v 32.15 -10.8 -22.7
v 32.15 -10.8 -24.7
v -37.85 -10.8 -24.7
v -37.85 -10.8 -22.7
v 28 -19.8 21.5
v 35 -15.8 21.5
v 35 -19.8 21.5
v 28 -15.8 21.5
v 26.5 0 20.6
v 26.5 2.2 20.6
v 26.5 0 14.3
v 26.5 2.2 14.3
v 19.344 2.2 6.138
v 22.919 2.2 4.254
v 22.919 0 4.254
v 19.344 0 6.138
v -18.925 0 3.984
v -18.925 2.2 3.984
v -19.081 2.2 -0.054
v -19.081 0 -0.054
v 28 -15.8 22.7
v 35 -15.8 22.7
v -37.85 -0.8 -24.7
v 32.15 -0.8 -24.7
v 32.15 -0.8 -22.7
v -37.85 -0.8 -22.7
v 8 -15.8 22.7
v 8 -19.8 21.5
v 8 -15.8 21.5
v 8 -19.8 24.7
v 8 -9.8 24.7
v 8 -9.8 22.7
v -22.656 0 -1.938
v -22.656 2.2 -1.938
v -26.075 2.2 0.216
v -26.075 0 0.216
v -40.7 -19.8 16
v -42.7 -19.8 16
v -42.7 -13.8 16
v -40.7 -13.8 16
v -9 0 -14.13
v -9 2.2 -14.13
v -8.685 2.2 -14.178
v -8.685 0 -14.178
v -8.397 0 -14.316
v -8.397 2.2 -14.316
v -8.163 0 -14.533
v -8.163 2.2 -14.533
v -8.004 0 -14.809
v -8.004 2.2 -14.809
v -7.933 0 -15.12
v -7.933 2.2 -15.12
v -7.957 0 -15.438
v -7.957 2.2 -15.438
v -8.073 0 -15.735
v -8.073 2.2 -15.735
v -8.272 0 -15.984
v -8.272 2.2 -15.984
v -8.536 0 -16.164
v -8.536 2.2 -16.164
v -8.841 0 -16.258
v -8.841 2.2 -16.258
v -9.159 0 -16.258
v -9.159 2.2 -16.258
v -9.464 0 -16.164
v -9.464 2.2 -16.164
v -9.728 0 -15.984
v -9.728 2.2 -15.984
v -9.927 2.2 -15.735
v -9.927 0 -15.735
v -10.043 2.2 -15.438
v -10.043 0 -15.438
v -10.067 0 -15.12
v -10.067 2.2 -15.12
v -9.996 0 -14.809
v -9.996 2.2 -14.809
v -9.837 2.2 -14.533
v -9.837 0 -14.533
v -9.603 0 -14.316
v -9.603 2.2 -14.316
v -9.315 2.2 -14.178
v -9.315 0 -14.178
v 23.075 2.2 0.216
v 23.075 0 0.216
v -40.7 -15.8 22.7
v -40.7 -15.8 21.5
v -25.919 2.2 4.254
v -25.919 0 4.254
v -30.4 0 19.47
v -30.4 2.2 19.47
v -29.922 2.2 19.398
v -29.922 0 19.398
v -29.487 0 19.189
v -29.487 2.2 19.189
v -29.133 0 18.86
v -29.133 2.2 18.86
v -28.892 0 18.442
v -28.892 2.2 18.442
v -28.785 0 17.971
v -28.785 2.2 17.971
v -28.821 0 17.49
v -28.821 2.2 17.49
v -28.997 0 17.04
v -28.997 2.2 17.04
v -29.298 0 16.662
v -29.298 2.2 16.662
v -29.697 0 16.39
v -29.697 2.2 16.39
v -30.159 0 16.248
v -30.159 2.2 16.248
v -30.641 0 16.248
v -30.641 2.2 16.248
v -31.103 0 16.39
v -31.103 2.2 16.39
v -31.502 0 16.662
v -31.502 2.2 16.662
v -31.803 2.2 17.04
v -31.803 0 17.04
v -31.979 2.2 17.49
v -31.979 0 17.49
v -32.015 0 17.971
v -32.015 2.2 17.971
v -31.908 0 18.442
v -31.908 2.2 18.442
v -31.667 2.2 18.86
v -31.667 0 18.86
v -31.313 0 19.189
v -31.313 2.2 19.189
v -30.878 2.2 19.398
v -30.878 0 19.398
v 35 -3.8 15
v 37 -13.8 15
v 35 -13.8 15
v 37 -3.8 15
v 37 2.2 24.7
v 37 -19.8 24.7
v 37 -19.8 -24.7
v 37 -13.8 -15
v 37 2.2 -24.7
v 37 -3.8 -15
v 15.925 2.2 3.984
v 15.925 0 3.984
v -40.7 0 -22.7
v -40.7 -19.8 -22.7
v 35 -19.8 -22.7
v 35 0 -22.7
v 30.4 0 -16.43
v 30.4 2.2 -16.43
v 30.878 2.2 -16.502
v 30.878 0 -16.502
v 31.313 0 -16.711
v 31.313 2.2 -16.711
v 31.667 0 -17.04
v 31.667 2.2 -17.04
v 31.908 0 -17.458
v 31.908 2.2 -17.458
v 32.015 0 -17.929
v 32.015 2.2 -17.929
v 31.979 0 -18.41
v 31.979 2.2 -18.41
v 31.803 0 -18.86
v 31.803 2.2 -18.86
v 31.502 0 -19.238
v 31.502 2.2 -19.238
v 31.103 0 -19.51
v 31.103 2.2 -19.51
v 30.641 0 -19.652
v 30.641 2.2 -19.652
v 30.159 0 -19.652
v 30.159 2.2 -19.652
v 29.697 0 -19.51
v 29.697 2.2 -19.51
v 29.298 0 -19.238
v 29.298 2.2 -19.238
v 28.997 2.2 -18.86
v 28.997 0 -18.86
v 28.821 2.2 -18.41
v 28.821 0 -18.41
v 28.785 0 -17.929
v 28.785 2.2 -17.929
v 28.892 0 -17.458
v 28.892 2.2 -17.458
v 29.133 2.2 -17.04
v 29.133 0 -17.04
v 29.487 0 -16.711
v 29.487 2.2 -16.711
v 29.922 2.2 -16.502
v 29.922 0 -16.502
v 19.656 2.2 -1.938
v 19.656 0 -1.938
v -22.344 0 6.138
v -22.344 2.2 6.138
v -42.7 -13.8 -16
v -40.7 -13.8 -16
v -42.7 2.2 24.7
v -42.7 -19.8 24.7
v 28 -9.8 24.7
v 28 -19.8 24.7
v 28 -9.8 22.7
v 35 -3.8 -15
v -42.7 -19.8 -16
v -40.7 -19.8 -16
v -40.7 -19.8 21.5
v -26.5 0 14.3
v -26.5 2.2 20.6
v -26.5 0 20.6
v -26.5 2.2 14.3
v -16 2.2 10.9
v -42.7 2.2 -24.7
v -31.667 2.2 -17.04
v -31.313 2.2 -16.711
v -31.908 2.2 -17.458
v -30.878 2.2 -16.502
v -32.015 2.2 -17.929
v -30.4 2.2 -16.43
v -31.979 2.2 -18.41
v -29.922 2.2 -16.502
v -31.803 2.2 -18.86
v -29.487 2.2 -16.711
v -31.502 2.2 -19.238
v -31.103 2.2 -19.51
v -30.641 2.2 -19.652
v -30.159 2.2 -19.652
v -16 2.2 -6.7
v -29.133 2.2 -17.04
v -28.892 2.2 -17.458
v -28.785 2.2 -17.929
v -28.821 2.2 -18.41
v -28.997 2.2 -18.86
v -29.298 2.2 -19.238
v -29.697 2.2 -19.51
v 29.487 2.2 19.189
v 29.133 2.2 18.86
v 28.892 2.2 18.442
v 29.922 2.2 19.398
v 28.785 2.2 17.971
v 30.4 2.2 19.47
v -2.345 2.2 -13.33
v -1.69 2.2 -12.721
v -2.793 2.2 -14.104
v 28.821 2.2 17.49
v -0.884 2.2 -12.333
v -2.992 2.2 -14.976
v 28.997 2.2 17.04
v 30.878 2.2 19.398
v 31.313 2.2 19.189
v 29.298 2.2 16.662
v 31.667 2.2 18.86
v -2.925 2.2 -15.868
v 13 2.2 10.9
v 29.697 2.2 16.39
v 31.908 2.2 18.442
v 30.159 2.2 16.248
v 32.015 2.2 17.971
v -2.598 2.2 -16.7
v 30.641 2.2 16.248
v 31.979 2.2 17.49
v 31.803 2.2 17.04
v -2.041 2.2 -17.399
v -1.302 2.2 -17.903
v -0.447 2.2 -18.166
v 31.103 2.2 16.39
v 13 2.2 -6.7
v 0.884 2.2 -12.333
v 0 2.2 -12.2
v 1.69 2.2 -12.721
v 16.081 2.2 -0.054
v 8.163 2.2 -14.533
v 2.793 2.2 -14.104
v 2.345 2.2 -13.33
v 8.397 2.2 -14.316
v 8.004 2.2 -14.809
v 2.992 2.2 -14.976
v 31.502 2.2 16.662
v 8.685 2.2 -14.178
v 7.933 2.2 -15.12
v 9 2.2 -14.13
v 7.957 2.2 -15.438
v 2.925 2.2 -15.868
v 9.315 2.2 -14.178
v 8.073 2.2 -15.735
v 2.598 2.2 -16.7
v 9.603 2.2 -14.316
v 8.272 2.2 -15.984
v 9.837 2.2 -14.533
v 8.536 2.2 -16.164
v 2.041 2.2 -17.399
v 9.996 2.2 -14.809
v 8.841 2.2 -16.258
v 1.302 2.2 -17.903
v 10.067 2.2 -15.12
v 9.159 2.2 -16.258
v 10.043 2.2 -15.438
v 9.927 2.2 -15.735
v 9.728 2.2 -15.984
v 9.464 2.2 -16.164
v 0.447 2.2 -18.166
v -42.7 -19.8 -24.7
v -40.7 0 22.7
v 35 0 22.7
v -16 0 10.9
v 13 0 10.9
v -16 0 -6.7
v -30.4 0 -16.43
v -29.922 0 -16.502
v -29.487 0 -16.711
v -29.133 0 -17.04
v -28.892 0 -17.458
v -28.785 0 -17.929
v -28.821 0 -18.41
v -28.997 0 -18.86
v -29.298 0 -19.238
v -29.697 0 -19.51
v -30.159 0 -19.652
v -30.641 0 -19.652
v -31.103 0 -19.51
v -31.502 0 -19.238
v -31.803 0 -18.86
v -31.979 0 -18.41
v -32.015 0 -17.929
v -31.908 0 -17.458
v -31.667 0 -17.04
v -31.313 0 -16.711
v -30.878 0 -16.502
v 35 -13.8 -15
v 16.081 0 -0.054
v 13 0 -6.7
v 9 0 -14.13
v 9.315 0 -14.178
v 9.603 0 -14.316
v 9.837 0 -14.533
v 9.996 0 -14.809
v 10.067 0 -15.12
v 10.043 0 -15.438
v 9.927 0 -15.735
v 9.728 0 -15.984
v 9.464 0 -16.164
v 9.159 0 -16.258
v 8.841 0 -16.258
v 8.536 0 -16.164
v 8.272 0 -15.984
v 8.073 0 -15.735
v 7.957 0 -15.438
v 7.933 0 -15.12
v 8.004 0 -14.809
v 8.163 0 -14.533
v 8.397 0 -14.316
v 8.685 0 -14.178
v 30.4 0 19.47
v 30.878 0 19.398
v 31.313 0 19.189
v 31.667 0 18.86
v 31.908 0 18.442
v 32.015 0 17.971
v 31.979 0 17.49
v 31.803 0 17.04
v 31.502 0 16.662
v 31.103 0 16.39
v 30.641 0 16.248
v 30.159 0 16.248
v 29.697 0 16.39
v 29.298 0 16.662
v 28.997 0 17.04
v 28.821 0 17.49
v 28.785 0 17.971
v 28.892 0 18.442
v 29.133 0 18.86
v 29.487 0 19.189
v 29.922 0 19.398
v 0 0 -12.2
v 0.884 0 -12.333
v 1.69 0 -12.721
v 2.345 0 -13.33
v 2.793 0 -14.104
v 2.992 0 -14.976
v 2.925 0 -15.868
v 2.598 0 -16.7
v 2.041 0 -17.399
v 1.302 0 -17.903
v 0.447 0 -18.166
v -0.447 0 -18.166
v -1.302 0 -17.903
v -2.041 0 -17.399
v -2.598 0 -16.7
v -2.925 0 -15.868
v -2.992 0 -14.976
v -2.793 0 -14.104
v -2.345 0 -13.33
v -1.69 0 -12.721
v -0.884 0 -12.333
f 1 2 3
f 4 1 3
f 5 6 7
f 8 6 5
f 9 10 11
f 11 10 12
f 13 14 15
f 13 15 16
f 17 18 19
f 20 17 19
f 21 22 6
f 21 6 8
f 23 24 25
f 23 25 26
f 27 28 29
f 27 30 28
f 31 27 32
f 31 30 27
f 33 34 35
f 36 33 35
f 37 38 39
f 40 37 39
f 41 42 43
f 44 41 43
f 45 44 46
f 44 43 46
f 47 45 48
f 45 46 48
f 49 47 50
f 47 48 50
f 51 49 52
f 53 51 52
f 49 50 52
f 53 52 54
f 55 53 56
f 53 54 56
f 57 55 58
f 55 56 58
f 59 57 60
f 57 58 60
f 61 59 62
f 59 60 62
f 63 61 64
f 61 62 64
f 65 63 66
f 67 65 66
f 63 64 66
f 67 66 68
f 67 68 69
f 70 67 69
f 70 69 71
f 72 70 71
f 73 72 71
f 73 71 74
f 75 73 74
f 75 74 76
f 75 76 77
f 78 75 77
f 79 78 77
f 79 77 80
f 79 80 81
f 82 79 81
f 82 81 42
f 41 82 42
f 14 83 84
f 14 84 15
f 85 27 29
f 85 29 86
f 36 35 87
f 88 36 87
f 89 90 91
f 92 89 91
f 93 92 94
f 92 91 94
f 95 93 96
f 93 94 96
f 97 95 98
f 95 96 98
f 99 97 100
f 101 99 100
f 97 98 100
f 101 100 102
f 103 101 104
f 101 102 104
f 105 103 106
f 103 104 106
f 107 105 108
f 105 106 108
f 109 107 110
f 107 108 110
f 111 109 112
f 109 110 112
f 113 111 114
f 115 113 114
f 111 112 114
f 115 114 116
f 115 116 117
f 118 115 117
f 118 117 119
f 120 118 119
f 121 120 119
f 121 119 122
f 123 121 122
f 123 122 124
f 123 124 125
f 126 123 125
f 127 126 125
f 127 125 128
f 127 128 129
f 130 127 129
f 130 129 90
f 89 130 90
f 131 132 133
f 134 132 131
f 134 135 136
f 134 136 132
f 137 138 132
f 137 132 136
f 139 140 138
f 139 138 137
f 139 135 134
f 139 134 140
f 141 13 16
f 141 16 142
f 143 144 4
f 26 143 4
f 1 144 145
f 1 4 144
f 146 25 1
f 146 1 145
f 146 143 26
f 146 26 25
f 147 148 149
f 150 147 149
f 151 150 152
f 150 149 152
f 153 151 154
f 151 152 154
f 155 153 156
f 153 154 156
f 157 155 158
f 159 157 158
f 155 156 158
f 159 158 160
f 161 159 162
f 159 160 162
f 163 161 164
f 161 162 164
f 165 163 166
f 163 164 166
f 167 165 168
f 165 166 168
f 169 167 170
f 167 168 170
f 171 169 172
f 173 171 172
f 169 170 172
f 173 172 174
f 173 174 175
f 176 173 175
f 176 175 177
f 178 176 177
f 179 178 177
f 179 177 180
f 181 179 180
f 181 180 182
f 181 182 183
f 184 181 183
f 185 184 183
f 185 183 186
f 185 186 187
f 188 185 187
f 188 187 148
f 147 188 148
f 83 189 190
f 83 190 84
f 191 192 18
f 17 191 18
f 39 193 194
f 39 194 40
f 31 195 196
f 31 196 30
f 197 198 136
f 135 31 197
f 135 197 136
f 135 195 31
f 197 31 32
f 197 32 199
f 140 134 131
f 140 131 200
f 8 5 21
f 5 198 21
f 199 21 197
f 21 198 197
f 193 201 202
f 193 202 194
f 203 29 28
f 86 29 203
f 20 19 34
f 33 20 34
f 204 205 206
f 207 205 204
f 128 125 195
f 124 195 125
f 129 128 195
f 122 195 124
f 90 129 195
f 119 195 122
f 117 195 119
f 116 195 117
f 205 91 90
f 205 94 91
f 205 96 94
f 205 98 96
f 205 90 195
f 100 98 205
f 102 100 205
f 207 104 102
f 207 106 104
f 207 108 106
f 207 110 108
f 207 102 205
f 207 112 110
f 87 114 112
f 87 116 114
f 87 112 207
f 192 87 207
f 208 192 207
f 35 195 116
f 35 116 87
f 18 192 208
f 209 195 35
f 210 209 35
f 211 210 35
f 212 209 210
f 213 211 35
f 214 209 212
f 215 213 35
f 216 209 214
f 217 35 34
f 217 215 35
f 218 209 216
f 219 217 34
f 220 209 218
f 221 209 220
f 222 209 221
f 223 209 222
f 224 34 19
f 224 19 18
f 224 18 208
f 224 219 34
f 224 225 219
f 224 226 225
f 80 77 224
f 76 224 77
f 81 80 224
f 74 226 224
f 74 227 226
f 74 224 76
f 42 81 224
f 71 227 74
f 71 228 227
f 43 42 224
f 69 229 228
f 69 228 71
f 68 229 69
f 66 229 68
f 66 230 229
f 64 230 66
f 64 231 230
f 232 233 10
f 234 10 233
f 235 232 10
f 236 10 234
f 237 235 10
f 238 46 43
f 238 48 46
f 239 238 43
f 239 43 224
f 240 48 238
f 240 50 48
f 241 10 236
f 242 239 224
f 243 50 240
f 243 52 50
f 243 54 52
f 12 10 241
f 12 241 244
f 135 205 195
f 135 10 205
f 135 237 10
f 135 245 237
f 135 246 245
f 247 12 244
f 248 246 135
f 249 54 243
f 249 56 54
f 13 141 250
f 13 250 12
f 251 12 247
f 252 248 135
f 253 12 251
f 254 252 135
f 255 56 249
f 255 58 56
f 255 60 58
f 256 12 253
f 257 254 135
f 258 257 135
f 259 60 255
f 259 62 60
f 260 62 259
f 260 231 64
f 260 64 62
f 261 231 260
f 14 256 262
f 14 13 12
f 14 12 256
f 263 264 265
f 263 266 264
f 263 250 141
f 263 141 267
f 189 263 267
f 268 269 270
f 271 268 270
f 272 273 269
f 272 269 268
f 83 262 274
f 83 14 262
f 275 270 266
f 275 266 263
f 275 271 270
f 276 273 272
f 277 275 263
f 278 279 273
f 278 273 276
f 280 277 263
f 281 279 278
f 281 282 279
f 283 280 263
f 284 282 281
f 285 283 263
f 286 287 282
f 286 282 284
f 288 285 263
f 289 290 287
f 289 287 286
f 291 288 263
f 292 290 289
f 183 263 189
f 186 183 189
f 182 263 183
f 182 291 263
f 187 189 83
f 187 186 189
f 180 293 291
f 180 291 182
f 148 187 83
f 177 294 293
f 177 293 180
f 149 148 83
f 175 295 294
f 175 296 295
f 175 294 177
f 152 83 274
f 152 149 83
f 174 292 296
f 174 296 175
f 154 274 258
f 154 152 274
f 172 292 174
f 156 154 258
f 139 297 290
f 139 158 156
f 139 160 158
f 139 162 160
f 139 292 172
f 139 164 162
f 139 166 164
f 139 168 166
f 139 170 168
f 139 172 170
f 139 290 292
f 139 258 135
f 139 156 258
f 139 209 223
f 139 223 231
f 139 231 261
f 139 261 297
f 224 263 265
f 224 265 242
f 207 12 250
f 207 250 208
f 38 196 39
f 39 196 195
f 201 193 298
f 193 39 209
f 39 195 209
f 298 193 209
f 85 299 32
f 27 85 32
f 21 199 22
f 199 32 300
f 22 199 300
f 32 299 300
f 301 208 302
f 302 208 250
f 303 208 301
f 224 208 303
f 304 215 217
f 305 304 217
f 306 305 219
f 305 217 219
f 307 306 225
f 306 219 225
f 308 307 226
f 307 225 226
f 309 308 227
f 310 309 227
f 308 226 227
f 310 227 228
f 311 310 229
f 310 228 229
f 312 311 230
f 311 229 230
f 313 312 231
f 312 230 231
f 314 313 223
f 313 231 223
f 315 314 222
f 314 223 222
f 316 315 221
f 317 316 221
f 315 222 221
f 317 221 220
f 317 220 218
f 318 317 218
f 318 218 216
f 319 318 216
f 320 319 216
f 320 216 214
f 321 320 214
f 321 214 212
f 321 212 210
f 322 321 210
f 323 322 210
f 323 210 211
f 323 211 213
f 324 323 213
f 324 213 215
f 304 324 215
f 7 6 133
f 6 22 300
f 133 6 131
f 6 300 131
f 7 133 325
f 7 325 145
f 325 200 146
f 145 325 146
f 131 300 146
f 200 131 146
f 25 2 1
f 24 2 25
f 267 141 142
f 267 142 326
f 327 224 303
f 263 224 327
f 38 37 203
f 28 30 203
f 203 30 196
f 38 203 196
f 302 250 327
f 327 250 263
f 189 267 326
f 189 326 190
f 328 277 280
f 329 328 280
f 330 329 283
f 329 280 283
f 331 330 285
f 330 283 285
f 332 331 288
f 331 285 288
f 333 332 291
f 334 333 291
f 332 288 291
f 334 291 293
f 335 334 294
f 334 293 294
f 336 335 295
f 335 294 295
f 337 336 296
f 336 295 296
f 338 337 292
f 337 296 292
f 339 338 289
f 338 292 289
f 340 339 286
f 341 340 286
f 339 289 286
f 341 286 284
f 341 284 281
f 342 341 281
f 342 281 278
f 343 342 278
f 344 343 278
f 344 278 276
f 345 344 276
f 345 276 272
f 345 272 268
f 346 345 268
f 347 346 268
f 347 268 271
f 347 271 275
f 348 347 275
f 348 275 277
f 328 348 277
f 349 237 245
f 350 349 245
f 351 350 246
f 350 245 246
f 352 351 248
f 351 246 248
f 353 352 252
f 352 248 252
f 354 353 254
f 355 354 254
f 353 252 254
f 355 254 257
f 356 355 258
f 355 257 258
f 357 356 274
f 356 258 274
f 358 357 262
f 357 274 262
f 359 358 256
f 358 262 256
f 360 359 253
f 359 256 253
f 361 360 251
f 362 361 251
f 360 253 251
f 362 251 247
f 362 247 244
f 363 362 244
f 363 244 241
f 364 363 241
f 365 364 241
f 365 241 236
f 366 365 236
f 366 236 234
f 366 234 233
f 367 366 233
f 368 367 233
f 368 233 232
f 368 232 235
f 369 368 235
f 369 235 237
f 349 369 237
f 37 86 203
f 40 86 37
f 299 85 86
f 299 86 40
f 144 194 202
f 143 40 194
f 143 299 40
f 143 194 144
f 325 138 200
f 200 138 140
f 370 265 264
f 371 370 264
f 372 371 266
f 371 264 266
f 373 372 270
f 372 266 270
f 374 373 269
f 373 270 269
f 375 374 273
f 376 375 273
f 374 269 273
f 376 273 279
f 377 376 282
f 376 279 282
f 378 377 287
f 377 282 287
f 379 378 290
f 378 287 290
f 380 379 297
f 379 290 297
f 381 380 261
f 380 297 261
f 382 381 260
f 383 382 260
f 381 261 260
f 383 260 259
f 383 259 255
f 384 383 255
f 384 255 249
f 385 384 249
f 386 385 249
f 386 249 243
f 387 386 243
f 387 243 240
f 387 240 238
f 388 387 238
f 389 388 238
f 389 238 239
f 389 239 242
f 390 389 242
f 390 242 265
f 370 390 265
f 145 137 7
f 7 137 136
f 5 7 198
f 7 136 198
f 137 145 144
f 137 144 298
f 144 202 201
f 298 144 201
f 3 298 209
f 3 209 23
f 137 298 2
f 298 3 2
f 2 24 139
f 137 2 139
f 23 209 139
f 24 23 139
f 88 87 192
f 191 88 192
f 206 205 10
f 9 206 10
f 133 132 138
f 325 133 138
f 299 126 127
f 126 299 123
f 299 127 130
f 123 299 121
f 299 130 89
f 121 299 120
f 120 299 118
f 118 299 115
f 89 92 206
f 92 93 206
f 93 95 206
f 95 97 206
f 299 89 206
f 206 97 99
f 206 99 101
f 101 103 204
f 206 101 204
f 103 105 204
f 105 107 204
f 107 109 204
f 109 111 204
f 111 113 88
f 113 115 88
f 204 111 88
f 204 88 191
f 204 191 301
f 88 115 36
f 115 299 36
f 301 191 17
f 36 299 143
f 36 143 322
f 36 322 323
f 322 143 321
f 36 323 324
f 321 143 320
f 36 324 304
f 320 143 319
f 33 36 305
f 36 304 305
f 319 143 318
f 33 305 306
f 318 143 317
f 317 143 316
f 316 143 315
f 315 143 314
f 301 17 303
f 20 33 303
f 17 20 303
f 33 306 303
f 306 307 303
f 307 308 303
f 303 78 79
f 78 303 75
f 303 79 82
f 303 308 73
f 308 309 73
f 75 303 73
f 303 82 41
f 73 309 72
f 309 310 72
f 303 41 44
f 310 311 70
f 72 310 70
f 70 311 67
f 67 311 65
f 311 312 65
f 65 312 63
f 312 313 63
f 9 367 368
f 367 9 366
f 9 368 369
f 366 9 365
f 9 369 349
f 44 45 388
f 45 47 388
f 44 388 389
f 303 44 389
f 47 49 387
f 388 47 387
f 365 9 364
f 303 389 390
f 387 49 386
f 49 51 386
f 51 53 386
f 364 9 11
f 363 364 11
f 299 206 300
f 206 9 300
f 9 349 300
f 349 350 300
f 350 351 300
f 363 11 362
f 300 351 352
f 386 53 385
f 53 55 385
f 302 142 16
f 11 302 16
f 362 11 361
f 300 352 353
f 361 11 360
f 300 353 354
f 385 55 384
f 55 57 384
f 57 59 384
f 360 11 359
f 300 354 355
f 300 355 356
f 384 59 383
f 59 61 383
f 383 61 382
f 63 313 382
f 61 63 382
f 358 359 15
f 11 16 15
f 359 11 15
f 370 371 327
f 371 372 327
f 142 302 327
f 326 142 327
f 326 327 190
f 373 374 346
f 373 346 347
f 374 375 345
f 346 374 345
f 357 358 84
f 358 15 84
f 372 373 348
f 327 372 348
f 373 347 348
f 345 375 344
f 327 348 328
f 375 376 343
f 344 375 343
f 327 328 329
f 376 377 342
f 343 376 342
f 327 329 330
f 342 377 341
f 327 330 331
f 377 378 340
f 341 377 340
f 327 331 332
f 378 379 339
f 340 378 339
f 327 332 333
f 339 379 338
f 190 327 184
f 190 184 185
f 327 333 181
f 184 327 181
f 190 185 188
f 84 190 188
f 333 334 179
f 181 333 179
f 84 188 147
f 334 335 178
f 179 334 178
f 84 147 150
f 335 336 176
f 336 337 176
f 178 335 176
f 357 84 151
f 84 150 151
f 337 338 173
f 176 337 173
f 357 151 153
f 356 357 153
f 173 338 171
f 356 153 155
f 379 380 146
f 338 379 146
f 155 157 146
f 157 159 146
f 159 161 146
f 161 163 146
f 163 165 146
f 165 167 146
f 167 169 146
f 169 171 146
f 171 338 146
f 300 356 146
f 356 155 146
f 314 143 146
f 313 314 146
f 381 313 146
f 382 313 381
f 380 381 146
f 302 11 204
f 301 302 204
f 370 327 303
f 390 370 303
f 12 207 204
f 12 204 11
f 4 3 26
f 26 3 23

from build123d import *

# Parameters (mm, degrees)
SKETCH_1_W           = 70
SKETCH_1_H           = 45.4
EXTRUDE_1_DEPTH      = 2.2
SKETCH_2_R           = 1.62
CUT_EXTRUDE_1_DEPTH  = 12.2
SKETCH_3_W           = 29
SKETCH_3_H           = 17.6
CUT_EXTRUDE_2_DEPTH  = 12.2
SKETCH_5_R           = 1.07
SKETCH_5_R_2         = 3
CUT_EXTRUDE_4_DEPTH  = 12.2
SKETCH_6_W           = 53
SKETCH_6_H           = 6.3
CUT_EXTRUDE_5_DEPTH  = 12.2
SKETCH_7_W           = 75.7
SKETCH_7_H           = 2
EXTRUDE_3_DEPTH      = 22
SKETCH_8_W           = 2
SKETCH_8_H           = 49.4
EXTRUDE_4_DEPTH      = 22
SKETCH_9_W           = 75.7
SKETCH_9_H           = 2
EXTRUDE_5_DEPTH      = 22
SKETCH_10_W          = 5.7
SKETCH_10_H          = 45.4
EXTRUDE_6_DEPTH      = 2.2
SKETCH_11_W          = 2
SKETCH_11_H          = 49.4
EXTRUDE_7_DEPTH      = 22
SKETCH_12_W          = 20
SKETCH_12_H          = 10
CUT_EXTRUDE_6_DEPTH  = 22
SKETCH_13_W          = 32
SKETCH_13_H          = 6
CUT_EXTRUDE_7_DEPTH  = 22
SKETCH_14_W          = 30
SKETCH_14_H          = 10
CUT_EXTRUDE_8_DEPTH  = 22
SKETCH_16_W          = 70
SKETCH_16_H          = 10
CUT_EXTRUDE_9_DEPTH  = 22
SKETCH_17_W          = 48.7
SKETCH_17_H          = 4
EXTRUDE_8_DEPTH      = 1.2
SKETCH_18_W          = 7
SKETCH_18_H          = 4
EXTRUDE_9_DEPTH      = 1.2
CUT_EXTRUDE_10_DEPTH = 11.2


with BuildPart() as part:
    # 草图1 → 凸台-拉伸1 (new body)
    with BuildSketch(Plane(origin=(0, 0, 0), x_dir=(1, 0, 0), z_dir=(0, 1, 0))):
        Rectangle(SKETCH_1_W, SKETCH_1_H)
    extrude(amount=EXTRUDE_1_DEPTH)

    # 草图2 → 切除-拉伸1 (cut)
    with BuildSketch(Plane(origin=(0, 2.2, 0), x_dir=(1, 0, 0), z_dir=(0, 1, 0))):
        with Locations(Location((-30.4, 18.05, 0), (0, 0, 270))):
            Circle(SKETCH_2_R)
        with Locations(Location((-30.4, -17.85, 0), (0, 0, 270))):
            Circle(SKETCH_2_R)
        with Locations(Location((30.4, -17.85, 0), (0, 0, 270))):
            Circle(SKETCH_2_R)
        with Locations(Location((30.4, 18.05, 0), (0, 0, 270))):
            Circle(SKETCH_2_R)
    extrude(amount=-CUT_EXTRUDE_1_DEPTH, mode=Mode.SUBTRACT)

    # 草图3 → 切除-拉伸2 (cut)
    with BuildSketch(Plane(origin=(0, 2.2, 0), x_dir=(1, 0, 0), z_dir=(0, 1, 0))):
        with Locations((-1.5, -2.1)):
            Rectangle(SKETCH_3_W, SKETCH_3_H)
    extrude(amount=-CUT_EXTRUDE_2_DEPTH, mode=Mode.SUBTRACT)

    # 草图5 → 切除-拉伸4 (cut)
    with BuildSketch(Plane(origin=(0, 2.2, 0), x_dir=(1, 0, 0), z_dir=(0, 1, 0))):
        with Locations(Location((9, 15.2, 0), (0, 0, 270))):
            Circle(SKETCH_5_R)
        with Locations(Location((-9, 15.2, 0), (0, 0, 270))):
            Circle(SKETCH_5_R)
        with Locations(Location((0, 15.2, 0), (0, 0, 270))):
            Circle(SKETCH_5_R_2)
    extrude(amount=-CUT_EXTRUDE_4_DEPTH, mode=Mode.SUBTRACT)

    # 草图6 → 切除-拉伸5 (cut)
    with BuildSketch(Plane(origin=(0, 2.2, 0), x_dir=(1, 0, 0), z_dir=(0, 1, 0))):
        with Locations((0, -17.45)):
            Rectangle(SKETCH_6_W, SKETCH_6_H)
    extrude(amount=-CUT_EXTRUDE_5_DEPTH, mode=Mode.SUBTRACT)

    # 草图7 → 凸台-拉伸3 (add)
    with BuildSketch(Plane(origin=(0, 2.2, 0), x_dir=(1, 0, 0), z_dir=(0, 1, 0))):
        with Locations((-2.85, 23.7)):
            Rectangle(SKETCH_7_W, SKETCH_7_H)
    extrude(amount=-EXTRUDE_3_DEPTH)

    # 草图8 → 凸台-拉伸4 (add)
    with BuildSketch(Plane(origin=(0, 2.2, 0), x_dir=(1, 0, 0), z_dir=(0, 1, 0))):
        with Locations((36, 0)):
            Rectangle(SKETCH_8_W, SKETCH_8_H)
    extrude(amount=-EXTRUDE_4_DEPTH)

    # 草图9 → 凸台-拉伸5 (add)
    with BuildSketch(Plane(origin=(0, 2.2, 0), x_dir=(1, 0, 0), z_dir=(0, 1, 0))):
        with Locations((-2.85, -23.7)):
            Rectangle(SKETCH_9_W, SKETCH_9_H)
    extrude(amount=-EXTRUDE_5_DEPTH)

    # 草图10 → 凸台-拉伸6 (add)
    with BuildSketch(Plane(origin=(0, 2.2, 0), x_dir=(1, 0, 0), z_dir=(0, 1, 0))):
        with Locations((-37.85, 0)):
            Rectangle(SKETCH_10_W, SKETCH_10_H)
    extrude(amount=-EXTRUDE_6_DEPTH)

    # 草图11 → 凸台-拉伸7 (add)
    with BuildSketch(Plane(origin=(0, 2.2, 0), x_dir=(1, 0, 0), z_dir=(0, 1, 0))):
        with Locations((-41.7, 0)):
            Rectangle(SKETCH_11_W, SKETCH_11_H)
    extrude(amount=-EXTRUDE_7_DEPTH)

    # 草图12 → 切除-拉伸6 (cut)
    with BuildSketch(Plane.XY.offset(24.7)):
        with Locations((18, -14.8)):
            Rectangle(SKETCH_12_W, SKETCH_12_H)
    extrude(amount=-CUT_EXTRUDE_6_DEPTH, mode=Mode.SUBTRACT)

    # 草图13 → 切除-拉伸7 (cut)
    with BuildSketch(Plane.ZY.offset(42.7)):
        with Locations((0, -16.8)):
            Rectangle(SKETCH_13_W, SKETCH_13_H)
    extrude(amount=-CUT_EXTRUDE_7_DEPTH, mode=Mode.SUBTRACT)

    # 草图14 → 切除-拉伸8 (cut)
    with BuildSketch(Plane(origin=(37, 0, 0), x_dir=(0, 0, -1), z_dir=(1, 0, 0))):
        with Locations((0, -8.8)):
            Rectangle(SKETCH_14_W, SKETCH_14_H)
    extrude(amount=-CUT_EXTRUDE_8_DEPTH, mode=Mode.SUBTRACT)

    # 草图16 → 切除-拉伸9 (cut)
    with BuildSketch(Plane(origin=(0, 0, -24.7), x_dir=(-1, 0, 0), z_dir=(0, 0, -1))):
        with Locations((2.85, -5.8)):
            Rectangle(SKETCH_16_W, SKETCH_16_H)
    extrude(amount=-CUT_EXTRUDE_9_DEPTH, mode=Mode.SUBTRACT)

    # 草图17 → 凸台-拉伸8 (add)
    with BuildSketch(Plane(origin=(0, 0, 22.7), x_dir=(-1, 0, 0), z_dir=(0, 0, -1))):
        with Locations((16.35, -17.8)):
            Rectangle(SKETCH_17_W, SKETCH_17_H)
    extrude(amount=EXTRUDE_8_DEPTH)

    # 草图18 → 凸台-拉伸9 (add)
    with BuildSketch(Plane(origin=(0, 0, 22.7), x_dir=(-1, 0, 0), z_dir=(0, 0, -1))):
        with Locations((-31.5, -17.8)):
            Rectangle(SKETCH_18_W, SKETCH_18_H)
    extrude(amount=EXTRUDE_9_DEPTH)

    # 草图19 → 切除-拉伸10 (cut)
    with BuildSketch(Plane(origin=(0, 2.2, 0), x_dir=(1, 0, 0), z_dir=(0, 1, 0))):
        Polygon((22.919485098, -4.254171533), (19.344175277, -6.13844673), (15.924690179, -3.984275197), (16.080514902, 0.054171533), (19.655824723, 1.93844673), (23.075309821, -0.215724803), align=None)
        Polygon((-19.080514902, 0.054171533), (-22.655824723, 1.93844673), (-26.075309821, -0.215724803), (-25.919485098, -4.254171533), (-22.344175277, -6.13844673), (-18.924690179, -3.984275197), align=None)
    extrude(amount=-CUT_EXTRUDE_10_DEPTH, mode=Mode.SUBTRACT)


solid = part.part
